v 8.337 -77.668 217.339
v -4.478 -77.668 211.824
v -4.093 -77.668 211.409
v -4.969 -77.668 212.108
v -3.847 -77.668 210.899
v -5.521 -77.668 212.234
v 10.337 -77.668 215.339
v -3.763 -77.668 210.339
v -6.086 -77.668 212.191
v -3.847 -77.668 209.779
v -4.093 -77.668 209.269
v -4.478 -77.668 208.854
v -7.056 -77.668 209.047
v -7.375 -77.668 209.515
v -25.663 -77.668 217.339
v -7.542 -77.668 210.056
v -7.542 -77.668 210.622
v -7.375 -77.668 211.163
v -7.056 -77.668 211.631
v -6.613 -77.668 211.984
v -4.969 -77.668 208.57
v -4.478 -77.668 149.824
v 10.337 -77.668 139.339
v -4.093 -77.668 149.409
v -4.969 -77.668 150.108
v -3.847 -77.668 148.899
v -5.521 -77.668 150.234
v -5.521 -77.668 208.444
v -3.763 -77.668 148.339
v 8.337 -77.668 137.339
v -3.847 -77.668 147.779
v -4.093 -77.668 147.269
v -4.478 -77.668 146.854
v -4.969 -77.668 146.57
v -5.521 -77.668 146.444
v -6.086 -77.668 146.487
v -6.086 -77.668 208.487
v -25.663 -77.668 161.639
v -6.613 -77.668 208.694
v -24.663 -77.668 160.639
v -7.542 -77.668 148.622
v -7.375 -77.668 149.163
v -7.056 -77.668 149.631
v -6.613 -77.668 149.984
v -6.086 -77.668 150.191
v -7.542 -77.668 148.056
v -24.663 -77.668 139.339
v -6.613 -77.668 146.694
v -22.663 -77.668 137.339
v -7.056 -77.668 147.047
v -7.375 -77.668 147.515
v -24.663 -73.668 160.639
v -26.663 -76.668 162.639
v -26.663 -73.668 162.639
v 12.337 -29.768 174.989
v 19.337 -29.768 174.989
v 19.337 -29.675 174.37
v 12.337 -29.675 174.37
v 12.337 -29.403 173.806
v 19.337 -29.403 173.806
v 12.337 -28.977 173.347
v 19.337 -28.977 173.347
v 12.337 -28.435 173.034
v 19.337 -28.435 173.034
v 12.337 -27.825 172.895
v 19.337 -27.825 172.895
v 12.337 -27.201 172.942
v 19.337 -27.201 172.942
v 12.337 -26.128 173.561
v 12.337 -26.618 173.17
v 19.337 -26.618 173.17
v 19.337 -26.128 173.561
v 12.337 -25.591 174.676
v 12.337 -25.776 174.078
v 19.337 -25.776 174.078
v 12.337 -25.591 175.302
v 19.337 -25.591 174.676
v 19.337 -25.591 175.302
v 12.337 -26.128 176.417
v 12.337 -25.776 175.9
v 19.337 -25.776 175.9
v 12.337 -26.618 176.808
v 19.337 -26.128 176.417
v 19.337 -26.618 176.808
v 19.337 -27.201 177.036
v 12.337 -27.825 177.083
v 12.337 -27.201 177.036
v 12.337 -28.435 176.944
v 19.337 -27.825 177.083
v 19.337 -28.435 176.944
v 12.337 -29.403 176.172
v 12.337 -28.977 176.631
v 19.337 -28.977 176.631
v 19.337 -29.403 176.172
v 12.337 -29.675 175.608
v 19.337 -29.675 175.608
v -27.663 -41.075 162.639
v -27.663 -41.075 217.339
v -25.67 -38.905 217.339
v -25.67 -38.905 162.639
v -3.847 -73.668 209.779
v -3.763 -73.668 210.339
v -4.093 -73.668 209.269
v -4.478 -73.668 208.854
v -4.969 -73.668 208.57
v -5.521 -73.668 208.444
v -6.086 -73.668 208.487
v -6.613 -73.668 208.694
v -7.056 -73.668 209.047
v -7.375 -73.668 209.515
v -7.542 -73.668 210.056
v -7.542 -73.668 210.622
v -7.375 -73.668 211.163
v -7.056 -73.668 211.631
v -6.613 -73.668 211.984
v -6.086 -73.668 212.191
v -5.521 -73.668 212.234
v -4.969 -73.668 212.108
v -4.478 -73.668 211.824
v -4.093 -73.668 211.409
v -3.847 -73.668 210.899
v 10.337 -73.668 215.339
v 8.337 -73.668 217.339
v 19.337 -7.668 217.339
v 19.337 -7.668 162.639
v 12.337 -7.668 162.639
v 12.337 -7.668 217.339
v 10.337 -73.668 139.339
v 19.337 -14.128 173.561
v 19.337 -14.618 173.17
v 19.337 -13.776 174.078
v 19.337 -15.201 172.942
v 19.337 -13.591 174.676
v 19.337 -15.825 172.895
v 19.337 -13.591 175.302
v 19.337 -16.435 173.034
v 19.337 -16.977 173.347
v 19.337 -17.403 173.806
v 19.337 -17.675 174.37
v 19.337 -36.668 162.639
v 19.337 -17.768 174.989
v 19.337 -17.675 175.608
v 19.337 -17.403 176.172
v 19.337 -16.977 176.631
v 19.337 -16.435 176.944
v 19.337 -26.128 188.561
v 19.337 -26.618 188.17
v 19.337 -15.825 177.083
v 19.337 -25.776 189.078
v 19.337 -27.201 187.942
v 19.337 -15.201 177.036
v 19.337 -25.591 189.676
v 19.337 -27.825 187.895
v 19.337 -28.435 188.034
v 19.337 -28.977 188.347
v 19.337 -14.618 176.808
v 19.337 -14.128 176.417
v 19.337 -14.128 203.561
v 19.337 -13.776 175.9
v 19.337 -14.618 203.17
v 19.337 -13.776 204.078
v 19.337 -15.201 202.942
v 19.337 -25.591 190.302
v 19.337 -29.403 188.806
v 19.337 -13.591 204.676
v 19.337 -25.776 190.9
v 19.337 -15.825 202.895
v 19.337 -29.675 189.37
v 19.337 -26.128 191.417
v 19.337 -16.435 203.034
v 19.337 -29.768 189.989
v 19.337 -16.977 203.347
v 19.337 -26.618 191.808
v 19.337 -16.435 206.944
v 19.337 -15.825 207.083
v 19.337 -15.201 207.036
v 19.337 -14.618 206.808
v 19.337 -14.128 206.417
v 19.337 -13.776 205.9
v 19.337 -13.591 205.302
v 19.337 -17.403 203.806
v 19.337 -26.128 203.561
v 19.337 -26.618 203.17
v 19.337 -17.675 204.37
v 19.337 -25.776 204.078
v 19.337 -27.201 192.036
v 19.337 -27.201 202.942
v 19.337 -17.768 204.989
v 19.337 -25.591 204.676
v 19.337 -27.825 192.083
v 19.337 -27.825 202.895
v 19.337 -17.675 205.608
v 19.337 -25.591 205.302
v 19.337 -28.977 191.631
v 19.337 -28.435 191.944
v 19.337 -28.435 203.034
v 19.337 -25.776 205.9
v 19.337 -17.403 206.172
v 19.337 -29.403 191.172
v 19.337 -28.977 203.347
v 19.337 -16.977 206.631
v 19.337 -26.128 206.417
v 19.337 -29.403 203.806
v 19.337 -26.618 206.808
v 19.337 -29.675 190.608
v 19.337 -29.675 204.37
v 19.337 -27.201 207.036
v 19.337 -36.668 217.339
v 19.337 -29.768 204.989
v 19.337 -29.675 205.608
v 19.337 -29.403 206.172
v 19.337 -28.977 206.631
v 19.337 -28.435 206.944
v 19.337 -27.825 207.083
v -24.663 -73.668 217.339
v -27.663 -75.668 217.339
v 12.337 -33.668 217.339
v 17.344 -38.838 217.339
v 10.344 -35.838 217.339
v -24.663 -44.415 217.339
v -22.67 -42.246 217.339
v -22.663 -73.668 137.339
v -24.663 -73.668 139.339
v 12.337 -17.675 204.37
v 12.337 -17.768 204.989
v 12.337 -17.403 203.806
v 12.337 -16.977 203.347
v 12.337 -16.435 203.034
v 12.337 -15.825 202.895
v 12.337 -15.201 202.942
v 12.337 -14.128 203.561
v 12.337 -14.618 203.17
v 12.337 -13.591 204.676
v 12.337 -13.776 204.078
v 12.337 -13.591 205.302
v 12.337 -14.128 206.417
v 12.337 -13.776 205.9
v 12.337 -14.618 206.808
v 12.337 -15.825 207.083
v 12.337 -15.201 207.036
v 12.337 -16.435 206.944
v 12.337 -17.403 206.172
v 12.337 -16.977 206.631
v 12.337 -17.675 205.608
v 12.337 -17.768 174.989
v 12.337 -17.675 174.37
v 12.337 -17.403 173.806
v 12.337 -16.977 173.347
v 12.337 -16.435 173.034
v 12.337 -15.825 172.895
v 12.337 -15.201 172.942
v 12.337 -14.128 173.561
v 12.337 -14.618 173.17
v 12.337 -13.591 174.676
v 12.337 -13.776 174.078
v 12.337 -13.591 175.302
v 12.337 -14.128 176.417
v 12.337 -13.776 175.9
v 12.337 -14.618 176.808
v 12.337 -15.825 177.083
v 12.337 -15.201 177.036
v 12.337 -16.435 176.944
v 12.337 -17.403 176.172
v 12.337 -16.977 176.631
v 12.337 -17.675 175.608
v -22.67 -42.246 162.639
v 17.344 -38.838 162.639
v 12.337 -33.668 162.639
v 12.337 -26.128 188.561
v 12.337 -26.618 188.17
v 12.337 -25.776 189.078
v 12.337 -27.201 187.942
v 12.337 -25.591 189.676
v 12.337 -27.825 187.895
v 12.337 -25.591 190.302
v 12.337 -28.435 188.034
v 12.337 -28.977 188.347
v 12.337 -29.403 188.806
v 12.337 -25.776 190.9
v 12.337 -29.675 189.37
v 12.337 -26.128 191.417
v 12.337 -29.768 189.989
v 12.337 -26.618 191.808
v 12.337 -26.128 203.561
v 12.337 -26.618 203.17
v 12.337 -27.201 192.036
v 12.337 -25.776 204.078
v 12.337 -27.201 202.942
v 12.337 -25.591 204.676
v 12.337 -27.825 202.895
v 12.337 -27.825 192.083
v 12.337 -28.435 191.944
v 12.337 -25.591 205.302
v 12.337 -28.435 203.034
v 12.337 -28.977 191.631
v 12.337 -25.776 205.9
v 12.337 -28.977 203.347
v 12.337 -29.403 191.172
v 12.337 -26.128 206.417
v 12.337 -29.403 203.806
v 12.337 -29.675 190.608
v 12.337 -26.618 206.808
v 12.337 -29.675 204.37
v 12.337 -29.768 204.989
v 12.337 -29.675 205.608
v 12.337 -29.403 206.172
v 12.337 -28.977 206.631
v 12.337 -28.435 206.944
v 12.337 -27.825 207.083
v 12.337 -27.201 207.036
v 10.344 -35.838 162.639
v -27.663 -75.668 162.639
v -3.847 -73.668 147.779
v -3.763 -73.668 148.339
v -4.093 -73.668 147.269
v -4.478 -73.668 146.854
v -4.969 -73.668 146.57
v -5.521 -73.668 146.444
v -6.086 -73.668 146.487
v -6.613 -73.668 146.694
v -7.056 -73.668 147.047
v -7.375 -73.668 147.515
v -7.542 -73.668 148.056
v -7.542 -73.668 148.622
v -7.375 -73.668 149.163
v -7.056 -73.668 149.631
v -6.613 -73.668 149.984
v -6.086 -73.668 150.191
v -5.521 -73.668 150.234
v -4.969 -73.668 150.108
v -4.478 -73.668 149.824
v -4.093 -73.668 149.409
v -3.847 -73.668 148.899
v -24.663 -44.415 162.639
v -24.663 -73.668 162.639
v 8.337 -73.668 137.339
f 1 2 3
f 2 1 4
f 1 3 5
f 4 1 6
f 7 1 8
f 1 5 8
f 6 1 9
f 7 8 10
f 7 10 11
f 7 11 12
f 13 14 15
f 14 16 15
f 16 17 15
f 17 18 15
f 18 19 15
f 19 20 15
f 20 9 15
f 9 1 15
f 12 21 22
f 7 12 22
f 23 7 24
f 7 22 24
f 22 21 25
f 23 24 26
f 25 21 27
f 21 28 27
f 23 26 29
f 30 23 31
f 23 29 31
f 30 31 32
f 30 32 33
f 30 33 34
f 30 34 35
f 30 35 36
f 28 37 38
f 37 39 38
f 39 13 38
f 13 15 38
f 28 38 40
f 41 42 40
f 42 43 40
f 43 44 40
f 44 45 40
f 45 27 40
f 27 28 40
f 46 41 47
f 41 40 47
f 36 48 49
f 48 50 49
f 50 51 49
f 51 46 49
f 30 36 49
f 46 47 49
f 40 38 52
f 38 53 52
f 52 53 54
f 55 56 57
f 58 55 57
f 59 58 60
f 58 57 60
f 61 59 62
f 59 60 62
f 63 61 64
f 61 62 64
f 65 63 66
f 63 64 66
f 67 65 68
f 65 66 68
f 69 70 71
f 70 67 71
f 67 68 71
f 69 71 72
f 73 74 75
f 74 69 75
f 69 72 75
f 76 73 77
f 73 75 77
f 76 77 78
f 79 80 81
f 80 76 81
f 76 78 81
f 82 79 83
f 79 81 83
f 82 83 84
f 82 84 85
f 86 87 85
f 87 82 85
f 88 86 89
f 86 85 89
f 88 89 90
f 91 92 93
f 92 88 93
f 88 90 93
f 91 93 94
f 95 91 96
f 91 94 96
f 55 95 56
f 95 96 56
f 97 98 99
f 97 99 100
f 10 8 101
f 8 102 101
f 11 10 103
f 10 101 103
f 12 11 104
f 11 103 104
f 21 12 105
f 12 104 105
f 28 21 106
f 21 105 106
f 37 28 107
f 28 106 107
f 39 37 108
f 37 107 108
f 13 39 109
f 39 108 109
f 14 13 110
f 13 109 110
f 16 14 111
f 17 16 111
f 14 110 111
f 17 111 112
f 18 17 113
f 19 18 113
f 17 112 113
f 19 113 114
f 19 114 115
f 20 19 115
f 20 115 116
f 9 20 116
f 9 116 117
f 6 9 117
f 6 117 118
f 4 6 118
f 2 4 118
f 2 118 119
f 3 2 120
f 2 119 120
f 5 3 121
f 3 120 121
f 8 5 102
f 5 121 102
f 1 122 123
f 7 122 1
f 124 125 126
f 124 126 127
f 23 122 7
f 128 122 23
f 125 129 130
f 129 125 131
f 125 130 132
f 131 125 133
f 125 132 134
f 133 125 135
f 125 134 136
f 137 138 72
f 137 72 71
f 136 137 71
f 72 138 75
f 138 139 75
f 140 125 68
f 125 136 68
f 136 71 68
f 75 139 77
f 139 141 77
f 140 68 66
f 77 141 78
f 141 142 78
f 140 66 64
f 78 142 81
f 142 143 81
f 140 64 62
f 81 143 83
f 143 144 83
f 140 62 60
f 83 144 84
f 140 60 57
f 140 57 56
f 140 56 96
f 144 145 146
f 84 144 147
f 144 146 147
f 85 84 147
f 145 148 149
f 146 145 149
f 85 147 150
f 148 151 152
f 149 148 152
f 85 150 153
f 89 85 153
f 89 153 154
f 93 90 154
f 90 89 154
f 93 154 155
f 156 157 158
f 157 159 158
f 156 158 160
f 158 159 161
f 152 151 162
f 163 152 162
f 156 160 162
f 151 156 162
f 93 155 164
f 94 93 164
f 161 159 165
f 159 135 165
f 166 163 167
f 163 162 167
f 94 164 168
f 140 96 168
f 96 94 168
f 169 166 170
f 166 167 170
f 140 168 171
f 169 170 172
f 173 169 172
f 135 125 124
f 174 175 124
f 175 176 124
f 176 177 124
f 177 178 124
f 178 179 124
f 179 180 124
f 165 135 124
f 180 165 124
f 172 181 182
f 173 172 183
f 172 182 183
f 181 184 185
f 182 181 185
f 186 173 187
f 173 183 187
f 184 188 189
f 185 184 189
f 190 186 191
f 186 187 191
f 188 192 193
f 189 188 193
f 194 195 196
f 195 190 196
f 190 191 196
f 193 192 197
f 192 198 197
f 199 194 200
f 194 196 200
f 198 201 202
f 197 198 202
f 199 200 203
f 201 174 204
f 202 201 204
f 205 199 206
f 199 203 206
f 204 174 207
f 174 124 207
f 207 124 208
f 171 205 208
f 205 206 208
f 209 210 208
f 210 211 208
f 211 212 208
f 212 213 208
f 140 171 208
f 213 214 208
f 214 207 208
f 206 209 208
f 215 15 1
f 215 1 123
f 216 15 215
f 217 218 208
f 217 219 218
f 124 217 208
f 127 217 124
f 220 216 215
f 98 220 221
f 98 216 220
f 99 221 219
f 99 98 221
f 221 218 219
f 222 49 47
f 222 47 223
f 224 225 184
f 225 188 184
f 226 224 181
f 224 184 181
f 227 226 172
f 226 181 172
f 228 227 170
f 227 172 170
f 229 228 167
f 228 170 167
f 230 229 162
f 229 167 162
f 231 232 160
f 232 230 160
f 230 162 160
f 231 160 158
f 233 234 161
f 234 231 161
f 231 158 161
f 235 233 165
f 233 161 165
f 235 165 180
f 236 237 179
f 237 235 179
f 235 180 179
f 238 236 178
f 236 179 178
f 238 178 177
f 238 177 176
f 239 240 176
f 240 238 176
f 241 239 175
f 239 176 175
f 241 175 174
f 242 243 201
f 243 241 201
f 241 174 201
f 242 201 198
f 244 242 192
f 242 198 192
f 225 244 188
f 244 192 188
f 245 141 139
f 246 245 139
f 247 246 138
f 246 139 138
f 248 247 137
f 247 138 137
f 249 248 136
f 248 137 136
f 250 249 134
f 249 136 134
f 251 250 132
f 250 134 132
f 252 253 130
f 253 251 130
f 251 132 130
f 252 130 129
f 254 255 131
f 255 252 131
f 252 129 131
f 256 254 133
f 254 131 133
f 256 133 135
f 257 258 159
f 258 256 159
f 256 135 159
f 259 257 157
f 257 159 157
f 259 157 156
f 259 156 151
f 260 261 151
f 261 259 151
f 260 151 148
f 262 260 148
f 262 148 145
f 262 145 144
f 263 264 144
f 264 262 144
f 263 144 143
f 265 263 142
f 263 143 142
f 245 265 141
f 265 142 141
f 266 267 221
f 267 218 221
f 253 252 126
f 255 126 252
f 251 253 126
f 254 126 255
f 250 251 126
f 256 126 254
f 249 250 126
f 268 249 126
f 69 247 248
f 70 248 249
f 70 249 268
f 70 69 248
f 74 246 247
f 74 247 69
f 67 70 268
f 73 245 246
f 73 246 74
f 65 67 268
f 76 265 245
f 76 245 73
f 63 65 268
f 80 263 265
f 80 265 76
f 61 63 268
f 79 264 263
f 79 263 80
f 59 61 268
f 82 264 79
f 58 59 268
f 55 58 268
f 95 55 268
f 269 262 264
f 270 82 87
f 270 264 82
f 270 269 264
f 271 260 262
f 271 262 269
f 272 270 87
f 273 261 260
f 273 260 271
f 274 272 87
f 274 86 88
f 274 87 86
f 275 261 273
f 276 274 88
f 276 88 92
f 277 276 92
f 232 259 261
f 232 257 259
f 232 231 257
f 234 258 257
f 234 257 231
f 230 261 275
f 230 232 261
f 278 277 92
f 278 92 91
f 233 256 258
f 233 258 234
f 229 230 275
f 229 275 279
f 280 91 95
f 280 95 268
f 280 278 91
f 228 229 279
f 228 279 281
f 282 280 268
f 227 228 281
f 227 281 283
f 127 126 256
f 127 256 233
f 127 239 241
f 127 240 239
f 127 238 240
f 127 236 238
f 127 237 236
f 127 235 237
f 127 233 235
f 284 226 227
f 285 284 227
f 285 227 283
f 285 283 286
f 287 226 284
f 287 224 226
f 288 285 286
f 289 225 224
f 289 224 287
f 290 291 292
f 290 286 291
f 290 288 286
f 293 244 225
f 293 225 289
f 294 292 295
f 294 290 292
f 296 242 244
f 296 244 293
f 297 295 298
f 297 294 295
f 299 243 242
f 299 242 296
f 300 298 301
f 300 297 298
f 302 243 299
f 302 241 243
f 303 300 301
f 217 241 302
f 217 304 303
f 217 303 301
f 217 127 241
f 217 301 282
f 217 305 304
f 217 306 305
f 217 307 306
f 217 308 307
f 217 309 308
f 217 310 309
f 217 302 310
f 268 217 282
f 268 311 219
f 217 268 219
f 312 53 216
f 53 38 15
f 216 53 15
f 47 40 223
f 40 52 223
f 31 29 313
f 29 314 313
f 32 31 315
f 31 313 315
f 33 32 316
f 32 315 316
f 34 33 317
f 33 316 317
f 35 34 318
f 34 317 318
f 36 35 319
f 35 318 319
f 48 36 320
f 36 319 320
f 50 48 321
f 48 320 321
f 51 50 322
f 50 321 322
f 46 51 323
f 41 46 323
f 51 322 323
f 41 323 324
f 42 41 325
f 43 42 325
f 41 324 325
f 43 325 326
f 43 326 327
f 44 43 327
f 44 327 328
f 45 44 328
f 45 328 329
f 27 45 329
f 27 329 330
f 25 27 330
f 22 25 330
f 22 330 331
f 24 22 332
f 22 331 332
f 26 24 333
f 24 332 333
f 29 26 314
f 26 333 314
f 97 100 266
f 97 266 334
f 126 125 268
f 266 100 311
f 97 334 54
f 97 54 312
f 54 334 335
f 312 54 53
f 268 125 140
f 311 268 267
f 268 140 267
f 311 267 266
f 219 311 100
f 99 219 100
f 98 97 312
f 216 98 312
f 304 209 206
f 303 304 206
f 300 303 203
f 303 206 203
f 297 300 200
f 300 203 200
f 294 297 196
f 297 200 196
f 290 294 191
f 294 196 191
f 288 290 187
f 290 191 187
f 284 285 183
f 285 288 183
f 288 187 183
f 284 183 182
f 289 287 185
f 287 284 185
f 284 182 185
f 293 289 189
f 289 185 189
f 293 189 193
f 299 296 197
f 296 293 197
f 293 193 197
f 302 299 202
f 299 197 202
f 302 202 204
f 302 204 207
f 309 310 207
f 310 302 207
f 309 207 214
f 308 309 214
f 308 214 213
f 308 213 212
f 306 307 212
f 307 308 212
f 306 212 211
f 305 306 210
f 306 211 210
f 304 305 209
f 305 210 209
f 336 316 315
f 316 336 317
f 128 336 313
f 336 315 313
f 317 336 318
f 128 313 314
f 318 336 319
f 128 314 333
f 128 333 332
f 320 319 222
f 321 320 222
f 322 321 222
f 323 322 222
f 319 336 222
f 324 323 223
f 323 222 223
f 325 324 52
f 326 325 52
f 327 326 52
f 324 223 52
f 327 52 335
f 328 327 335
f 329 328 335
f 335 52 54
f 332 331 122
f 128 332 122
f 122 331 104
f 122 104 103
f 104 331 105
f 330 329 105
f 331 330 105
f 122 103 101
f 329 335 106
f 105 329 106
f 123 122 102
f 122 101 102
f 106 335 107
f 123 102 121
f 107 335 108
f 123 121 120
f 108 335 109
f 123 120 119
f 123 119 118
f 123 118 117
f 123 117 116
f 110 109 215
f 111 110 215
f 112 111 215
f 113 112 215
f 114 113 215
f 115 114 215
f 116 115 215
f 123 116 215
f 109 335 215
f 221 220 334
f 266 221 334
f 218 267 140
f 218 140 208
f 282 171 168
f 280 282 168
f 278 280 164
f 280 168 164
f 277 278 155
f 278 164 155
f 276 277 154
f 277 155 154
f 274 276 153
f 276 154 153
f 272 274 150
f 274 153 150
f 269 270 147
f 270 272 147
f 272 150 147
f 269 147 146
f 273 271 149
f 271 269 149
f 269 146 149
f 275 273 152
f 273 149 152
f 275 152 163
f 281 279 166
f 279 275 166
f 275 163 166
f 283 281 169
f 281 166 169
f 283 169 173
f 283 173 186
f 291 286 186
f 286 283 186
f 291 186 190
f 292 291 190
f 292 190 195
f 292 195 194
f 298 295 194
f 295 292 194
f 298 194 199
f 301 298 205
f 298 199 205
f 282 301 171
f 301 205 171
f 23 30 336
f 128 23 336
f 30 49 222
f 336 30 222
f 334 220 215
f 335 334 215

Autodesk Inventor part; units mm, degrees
ref_plane "YZ Plane" through (0, 0, 0) normal (1, 0, 0) x (0, 1, 0)
ref_plane "XZ Plane" through (0, 0, 0) normal (0, 1, 0) x (-1, 0, 0)
ref_plane "XY Plane" through (0, 0, 0) normal (0, 0, 1) x (1, 0, 0)
ref_plane "工作平面1" through (19.3371, -7.6679, 114.989) normal (-1, 0, 0) x (0, -1, 0)
sketch "草图1" plane through (19.3371, -7.6679, 114.989) normal (-1, 0, 0) x (0, -1, 0)
  circle A0 centre (20, 75) radius 2.1
  circle A1 centre (20, 90) radius 2.1
  circle A2 centre (20, 60) radius 2.1
  circle A3 centre (8, 60) radius 2.1
  circle A4 centre (8, 90) radius 2.1
  line L0 (0, 0) -> (0, 214)
  circle A5 centre (12.0096, 5) radius 2.1
  circle A6 centre (25, 12.5) radius 2.1
  circle A7 centre (37.9904, 5) radius 2.1
  circle A8 centre (20, 75) radius 2.1
  circle A9 centre (20, 90) radius 2.1
  circle A10 centre (20, 60) radius 2.1
  circle A11 centre (8, 90) radius 2.1
  circle A12 centre (8, 60) radius 2.1
  circle A13 centre (15.7729, 200.5) radius 2.1
  circle A14 centre (28.7632, 208) radius 2.1
  circle A15 centre (28.7632, 178) radius 2.1
  circle A16 centre (15.7729, 185.5) radius 2.1
  circle A17 centre (41.7536, 200.5) radius 2.1
  circle A18 centre (41.7536, 185.5) radius 2.1
  circle A19 centre (28.7632, 193) radius 7.5
  arc A20 (48.2862, 199.5655) -> (25.6285, 214) centre (25.6285, 189) ccw
  line L1 (25.6285, 214) -> (0, 214)
  line L2 (0, 0) -> (0, 214)
  line L3 (0, 0) -> (64, 0)
  line L4 (64, 0) -> (64, 23)
  line L5 (66.8284, 25) -> (64, 23)
  line L6 (66.8284, 25) -> (70, 25)
  line L7 (70, 25) -> (70, 147.4576)
  arc A21 (70, 147.4576) -> (67.6577, 158.0231) centre (45, 147.4576) ccw
  line L8 (67.6577, 158.0231) -> (48.2862, 199.5655)
  circle A22 centre (64.4234, 100.25) radius 2.1
  circle A23 centre (37.5766, 49.75) radius 2.1
  circle A24 centre (64.4234, 65.25) radius 2.1
  circle A25 centre (37.5766, 100.25) radius 2.1
  circle A26 centre (64.4234, 84.75) radius 2.1
  circle A27 centre (51, 42) radius 2.1
  circle A28 centre (64.4234, 49.75) radius 2.1
  circle A29 centre (51, 108) radius 2.1
  circle A30 centre (33.7425, 67) radius 3.25
  circle A31 centre (59, 75) radius 3.25
  circle A32 centre (33.7425, 83) radius 3.25
  circle A33 centre (50, 75) radius 3.25
  circle A34 centre (41, 75) radius 3.25
  line L9 (0, 47.65) -> (28, 47.65)
  line L10 (28, 47.65) -> (28, 102.35)
  line L11 (28, 102.35) -> (0, 102.35)
  line L12 (0, 102.35) -> (0, 47.65)
  point P0 (-7.6679, -114.989)
  point P1 (0, 102.35)
  point P2 (0, 47.65)
extrude "拉伸1" add sketch "草图1" along normal blind 7 contours L0 L11 L10 L9
sketch "草图2" plane through (19.3371, -35.6679, 217.339) normal (0, 0, 1) x (1, 0, 0)
  line L0 (-6, -42) -> (-116, -42) projected
  line L1 (-6, -42) -> (-43, -42)
  line L2 (-43, -42) -> (-43, -14)
  line L3 (-43, -14) -> (-6, -14)
  line L4 (-6, -14) -> (-6, -42)
  line L5 (-48, -3.4068) -> (-48, -11.4068) projected
  line L6 (-47, -3.4068) -> (-47, 27) projected
  line L7 (0, 0) -> (-7, 0) projected
  line L8 (-7, 0) -> (-47, -3.4068)
  line L9 (-47, -3.4068) -> (-47, -42)
  line L10 (0, 0) -> (0, -3)
  line L11 (0, -3) -> (-44, -6.7475)
  line L12 (-44, -6.7475) -> (-44, -42)
  point P0 (-19.3371, 35.6679)
  dimension "d3" = 37
  dimension "d4" = 28
  dimension "d5" = 3
  dimension "d6" = 3
extrude "拉伸2" add sketch "草图2" against normal up to surface (54.7 mm away) contours L0 L9 L8 L7 L10 L11 L12
chamfer "倒角1" distance 2 angle 45 1 edges at (-24.6629, -42.4154, 189.989)
sketch "草图3" plane through (-24.6629, -77.6679, 217.339) normal (1, 0, 0) x (0, 0, -1)
  line L0 (0, 0) -> (0, 33.2525) projected
  line L1 (0, 0) -> (80, 0)
  line L2 (80, 0) -> (80, 4)
  line L3 (80, 4) -> (0, 4)
  line L4 (0, 4) -> (0, 0)
  point P0 (217.339, 77.6679)
  point P1 (0, 4)
  dimension "d12" = 80
  dimension "d13" = 4
extrude "拉伸3" add sketch "草图3" along normal blind 35
chamfer "倒角2" distance 2 angle 45 8 edges at (10.3371, -75.6679, 217.339) (10.3371, -75.6679, 137.339) (-27.6629, -39.0748, 189.989) (-24.6629, -75.6679, 137.339) (-24.6629, -75.6679, 162.639) (12.3371, -35.6679, 189.989) (19.3371, -38.6679, 189.989) (-27.6629, -77.6679, 189.989)
sketch "草图4" plane through (-24.6629, -73.6679, 217.339) normal (0, 1, 0) x (1, 0, 0)
  line L0 (2, 80) -> (33, 80) projected
  line L1 (19, 80) -> (19, -0.4467) construction
  line L2 (0, 78) -> (0, 56.7) projected
  line L3 (44, -44.0038) -> (44, 260.8962) projected
  circle A0 centre (19, 69) radius 1.9
  circle A1 centre (19, 7) radius 1.9
  point P0 (24.6629, 217.339)
  dimension "d19" = 19
  dimension "d20" = 25
  dimension "d21" = 3.8
  dimension "d22" = 3.8
  dimension "d23" = 62
  dimension "d24" = 11
extrude "拉伸4" cut sketch "草图4" against normal blind 35
properties part number "电气支架_2"
